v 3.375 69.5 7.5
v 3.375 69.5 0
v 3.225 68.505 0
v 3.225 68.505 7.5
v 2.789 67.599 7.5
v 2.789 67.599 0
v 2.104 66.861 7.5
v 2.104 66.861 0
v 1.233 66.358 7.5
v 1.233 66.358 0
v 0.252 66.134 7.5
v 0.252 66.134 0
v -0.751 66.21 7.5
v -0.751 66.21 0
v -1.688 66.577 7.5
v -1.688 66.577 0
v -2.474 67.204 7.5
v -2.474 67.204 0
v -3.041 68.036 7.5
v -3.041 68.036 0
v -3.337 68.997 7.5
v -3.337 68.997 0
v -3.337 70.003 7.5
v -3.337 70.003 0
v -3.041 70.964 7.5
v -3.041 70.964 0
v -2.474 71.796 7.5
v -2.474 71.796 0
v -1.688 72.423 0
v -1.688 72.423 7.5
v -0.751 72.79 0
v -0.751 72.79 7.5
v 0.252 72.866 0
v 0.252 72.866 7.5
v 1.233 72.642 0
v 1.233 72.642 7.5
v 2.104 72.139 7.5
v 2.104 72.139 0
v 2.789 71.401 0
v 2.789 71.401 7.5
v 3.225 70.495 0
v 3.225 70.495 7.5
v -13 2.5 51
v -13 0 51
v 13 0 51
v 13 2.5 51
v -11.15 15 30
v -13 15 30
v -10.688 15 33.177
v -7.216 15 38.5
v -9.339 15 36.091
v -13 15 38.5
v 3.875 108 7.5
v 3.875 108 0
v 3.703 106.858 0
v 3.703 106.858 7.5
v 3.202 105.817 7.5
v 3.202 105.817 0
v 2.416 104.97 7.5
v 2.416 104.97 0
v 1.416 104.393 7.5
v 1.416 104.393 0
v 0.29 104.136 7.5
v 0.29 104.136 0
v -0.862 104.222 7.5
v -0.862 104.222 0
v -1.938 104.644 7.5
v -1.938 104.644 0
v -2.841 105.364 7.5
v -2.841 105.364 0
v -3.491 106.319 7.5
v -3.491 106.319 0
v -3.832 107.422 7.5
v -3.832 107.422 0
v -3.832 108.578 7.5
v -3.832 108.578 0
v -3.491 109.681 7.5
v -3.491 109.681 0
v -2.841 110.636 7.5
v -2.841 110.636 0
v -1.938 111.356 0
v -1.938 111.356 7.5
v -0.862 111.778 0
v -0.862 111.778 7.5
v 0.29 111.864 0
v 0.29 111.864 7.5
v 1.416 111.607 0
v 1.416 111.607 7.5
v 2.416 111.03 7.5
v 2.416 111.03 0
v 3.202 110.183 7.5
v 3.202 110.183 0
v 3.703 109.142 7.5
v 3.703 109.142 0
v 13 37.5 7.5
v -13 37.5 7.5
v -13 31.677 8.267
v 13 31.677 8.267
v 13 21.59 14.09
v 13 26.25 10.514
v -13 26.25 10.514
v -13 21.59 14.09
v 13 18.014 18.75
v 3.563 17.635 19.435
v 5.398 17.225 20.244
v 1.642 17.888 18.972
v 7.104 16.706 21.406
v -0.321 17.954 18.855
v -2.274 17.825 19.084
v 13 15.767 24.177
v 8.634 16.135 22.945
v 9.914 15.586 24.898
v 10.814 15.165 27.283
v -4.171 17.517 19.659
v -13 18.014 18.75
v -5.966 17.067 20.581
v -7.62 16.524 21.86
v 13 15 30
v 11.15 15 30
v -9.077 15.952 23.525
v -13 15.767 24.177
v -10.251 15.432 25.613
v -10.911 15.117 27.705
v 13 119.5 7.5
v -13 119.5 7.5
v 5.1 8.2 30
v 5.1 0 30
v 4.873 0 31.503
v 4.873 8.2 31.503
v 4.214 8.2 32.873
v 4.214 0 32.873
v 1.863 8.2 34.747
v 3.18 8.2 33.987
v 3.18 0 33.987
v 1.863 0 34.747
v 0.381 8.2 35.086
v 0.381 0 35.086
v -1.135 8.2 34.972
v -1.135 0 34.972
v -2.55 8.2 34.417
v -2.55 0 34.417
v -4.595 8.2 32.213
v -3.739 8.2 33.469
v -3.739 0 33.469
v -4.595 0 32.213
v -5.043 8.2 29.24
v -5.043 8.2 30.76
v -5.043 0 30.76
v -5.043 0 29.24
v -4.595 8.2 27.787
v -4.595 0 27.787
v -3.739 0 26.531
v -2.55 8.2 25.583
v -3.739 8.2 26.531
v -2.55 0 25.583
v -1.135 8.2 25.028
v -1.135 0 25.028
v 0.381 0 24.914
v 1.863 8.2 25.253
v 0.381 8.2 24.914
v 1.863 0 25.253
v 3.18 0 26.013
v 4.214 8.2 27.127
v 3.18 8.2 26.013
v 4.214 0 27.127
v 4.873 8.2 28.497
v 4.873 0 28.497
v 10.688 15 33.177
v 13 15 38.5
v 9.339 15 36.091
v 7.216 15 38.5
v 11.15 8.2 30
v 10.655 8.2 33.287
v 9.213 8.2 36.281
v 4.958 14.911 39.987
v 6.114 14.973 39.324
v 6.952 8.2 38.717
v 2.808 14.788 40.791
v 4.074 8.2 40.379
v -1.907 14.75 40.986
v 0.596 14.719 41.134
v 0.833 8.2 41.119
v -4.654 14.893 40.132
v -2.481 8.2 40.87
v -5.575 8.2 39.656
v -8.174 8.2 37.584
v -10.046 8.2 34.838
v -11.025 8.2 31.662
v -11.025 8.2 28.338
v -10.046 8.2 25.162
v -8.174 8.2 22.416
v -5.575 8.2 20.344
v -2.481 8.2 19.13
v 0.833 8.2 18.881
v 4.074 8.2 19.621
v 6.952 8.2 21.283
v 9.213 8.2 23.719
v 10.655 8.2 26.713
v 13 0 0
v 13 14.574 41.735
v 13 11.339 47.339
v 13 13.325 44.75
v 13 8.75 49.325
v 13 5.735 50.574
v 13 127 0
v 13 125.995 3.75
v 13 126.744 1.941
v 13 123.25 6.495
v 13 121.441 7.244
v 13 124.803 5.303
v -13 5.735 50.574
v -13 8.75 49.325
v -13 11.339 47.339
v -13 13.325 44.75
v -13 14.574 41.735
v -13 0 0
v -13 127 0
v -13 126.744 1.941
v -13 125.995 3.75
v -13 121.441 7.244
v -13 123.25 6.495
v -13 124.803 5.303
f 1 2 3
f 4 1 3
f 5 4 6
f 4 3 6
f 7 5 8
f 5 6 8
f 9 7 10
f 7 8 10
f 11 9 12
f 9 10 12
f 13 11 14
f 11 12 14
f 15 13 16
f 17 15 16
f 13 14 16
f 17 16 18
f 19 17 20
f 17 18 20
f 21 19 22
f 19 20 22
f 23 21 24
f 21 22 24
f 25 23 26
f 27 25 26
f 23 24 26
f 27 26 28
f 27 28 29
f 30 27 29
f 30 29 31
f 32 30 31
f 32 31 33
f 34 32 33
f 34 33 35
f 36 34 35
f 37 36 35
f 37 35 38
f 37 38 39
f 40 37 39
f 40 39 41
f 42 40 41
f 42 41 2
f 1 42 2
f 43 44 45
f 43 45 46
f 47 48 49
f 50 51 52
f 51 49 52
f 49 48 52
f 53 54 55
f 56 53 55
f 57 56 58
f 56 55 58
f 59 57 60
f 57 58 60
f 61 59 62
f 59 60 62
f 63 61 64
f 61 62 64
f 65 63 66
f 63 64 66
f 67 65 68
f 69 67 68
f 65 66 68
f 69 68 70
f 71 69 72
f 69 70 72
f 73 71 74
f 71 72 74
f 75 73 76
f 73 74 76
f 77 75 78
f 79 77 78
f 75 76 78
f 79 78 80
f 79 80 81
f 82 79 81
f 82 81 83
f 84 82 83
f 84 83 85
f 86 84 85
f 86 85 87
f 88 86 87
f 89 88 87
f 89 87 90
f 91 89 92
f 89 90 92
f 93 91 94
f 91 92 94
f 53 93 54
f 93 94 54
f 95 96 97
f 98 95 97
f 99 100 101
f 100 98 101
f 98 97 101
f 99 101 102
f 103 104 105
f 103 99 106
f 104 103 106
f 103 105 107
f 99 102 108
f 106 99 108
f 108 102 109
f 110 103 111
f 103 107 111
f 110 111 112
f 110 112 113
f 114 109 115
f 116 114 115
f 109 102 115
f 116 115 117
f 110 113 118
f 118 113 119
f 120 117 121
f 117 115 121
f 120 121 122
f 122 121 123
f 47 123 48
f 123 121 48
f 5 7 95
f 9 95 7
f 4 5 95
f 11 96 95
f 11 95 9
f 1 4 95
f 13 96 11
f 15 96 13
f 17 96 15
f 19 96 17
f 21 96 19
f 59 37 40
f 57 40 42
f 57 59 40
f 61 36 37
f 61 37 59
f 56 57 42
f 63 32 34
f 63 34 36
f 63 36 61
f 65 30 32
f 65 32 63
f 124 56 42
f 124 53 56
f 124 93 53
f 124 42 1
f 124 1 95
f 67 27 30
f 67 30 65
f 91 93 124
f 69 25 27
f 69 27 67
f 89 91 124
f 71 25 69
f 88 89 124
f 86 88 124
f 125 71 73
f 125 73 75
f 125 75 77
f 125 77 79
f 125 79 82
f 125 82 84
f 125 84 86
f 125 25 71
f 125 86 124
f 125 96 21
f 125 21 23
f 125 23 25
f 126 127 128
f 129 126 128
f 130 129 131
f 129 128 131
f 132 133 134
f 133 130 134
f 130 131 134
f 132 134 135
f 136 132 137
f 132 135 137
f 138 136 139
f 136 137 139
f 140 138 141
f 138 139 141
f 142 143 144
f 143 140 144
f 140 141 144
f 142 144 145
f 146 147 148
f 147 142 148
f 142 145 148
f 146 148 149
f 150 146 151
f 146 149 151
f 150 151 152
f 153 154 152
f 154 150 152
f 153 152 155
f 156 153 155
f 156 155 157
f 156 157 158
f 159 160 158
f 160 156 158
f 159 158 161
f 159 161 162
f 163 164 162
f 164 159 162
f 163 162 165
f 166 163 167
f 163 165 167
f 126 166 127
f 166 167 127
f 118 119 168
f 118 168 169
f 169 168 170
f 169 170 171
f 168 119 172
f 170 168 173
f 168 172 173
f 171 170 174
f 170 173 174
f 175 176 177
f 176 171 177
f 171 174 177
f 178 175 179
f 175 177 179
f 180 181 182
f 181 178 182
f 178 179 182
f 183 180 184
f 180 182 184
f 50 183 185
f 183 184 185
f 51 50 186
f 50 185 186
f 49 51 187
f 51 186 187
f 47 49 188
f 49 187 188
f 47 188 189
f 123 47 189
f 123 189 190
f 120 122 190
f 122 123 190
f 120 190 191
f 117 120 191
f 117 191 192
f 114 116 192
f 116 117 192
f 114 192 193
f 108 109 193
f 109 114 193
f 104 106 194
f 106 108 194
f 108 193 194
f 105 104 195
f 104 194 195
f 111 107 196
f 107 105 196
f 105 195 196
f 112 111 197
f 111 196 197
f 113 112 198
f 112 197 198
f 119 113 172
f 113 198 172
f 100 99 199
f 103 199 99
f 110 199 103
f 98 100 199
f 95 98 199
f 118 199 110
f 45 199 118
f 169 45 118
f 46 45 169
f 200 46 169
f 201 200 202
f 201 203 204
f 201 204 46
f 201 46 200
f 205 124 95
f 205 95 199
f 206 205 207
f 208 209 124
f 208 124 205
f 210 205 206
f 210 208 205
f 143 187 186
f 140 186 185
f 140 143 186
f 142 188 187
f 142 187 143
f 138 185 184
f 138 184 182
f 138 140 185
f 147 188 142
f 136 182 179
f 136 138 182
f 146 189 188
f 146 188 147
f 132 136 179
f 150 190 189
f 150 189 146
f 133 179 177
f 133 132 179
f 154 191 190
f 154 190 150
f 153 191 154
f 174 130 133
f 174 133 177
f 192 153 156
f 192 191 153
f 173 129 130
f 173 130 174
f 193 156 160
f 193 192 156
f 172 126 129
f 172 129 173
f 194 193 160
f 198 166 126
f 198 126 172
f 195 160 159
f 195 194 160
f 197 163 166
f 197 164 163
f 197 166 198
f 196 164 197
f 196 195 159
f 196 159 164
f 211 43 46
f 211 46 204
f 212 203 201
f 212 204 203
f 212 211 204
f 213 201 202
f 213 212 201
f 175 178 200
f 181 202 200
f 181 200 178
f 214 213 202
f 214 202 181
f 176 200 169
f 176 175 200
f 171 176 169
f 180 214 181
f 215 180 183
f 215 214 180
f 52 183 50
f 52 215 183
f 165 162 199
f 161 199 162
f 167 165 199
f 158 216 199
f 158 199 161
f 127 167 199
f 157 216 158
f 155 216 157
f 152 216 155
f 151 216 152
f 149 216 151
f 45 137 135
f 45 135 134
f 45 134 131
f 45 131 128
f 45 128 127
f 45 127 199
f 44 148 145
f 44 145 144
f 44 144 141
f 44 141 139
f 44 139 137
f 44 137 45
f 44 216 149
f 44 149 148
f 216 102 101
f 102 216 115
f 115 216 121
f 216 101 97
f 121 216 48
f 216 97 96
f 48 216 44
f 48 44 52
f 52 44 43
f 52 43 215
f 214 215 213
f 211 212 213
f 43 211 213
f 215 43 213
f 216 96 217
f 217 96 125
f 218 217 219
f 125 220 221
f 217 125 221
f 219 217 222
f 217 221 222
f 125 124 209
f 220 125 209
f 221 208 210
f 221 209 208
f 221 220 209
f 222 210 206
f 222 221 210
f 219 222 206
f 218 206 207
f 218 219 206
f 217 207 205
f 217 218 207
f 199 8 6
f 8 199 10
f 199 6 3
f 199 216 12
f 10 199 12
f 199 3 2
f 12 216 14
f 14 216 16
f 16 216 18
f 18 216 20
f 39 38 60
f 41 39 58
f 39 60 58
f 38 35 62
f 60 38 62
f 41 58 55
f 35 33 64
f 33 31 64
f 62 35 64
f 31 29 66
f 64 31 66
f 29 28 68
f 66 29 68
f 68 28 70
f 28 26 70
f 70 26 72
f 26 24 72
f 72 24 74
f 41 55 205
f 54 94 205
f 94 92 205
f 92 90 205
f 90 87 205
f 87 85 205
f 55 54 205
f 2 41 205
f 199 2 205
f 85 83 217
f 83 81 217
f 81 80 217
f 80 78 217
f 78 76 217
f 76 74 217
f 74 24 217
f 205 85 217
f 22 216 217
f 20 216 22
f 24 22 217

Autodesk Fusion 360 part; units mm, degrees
sketch "Sketch1" plane through (0, 0, 0) normal (1, 0, 0) x (0, 1, 0)
  line L0 (0, 0) -> (0, 51)
  line L1 (0, 0) -> (127, 0)
  line L2 (127, 0) -> (127, 0.0001)
  line L3 (0, 51) -> (2.5, 51)
  line L4 (37.5, 7.5) -> (119.5, 7.5)
  line L5 (-5, 0) -> (-5, 33)
  line L6 (69.5, -10) -> (108, -10)
  line L7 (15, 30) -> (15, 38.5)
  arc A0 (15, 38.5) -> (2.5, 51) centre (2.5, 38.5) ccw
  arc A1 (127, 0.0001) -> (119.5, 7.5) centre (119.5, 0) ccw
  arc A2 (15, 30) -> (37.5, 7.5) centre (37.5, 30) ccw
  point P0 (126.9999, 7.5)
  point P1 (15, 51)
  point P2 (15, 7.5)
  dimension "d1" = 51
  dimension "d2" = 127
  dimension "d5" = 7.5
  dimension "d6" = 43.5
  dimension "d7" = 33
  dimension "d10" = 12.5
  dimension "d11" = 7.5
  dimension "d12" = 22.5
sketch "Sketch2" plane through (0, 0, 0) normal (0, 0, 1) x (1, 0, 0)
  circle A0 centre (0, 69.5) radius 3.375
  circle A1 centre (0, 108) radius 3.875
  dimension "d13" = 6.75
  dimension "d14" = 7.75
sketch "Sketch3" plane through (0, 0, 0) normal (0, 1, 0) x (1, 0, 0)
  circle A0 centre (0, -30) radius 5.1
  circle A1 centre (0, -30) radius 11.15
  dimension "d15" = 10.2
  dimension "d16" = 22.3
extrude "Extrude1" add sketch "Sketch1" along normal mid plane 26
extrude "Extrude2" cut sketch "Sketch2" along normal blind 20
extrude "Extrude3" cut sketch "Sketch3" along normal blind 90 contours A0
extrude "Extrude4" cut sketch "Sketch3" along normal blind 20 from surface at 8.2
